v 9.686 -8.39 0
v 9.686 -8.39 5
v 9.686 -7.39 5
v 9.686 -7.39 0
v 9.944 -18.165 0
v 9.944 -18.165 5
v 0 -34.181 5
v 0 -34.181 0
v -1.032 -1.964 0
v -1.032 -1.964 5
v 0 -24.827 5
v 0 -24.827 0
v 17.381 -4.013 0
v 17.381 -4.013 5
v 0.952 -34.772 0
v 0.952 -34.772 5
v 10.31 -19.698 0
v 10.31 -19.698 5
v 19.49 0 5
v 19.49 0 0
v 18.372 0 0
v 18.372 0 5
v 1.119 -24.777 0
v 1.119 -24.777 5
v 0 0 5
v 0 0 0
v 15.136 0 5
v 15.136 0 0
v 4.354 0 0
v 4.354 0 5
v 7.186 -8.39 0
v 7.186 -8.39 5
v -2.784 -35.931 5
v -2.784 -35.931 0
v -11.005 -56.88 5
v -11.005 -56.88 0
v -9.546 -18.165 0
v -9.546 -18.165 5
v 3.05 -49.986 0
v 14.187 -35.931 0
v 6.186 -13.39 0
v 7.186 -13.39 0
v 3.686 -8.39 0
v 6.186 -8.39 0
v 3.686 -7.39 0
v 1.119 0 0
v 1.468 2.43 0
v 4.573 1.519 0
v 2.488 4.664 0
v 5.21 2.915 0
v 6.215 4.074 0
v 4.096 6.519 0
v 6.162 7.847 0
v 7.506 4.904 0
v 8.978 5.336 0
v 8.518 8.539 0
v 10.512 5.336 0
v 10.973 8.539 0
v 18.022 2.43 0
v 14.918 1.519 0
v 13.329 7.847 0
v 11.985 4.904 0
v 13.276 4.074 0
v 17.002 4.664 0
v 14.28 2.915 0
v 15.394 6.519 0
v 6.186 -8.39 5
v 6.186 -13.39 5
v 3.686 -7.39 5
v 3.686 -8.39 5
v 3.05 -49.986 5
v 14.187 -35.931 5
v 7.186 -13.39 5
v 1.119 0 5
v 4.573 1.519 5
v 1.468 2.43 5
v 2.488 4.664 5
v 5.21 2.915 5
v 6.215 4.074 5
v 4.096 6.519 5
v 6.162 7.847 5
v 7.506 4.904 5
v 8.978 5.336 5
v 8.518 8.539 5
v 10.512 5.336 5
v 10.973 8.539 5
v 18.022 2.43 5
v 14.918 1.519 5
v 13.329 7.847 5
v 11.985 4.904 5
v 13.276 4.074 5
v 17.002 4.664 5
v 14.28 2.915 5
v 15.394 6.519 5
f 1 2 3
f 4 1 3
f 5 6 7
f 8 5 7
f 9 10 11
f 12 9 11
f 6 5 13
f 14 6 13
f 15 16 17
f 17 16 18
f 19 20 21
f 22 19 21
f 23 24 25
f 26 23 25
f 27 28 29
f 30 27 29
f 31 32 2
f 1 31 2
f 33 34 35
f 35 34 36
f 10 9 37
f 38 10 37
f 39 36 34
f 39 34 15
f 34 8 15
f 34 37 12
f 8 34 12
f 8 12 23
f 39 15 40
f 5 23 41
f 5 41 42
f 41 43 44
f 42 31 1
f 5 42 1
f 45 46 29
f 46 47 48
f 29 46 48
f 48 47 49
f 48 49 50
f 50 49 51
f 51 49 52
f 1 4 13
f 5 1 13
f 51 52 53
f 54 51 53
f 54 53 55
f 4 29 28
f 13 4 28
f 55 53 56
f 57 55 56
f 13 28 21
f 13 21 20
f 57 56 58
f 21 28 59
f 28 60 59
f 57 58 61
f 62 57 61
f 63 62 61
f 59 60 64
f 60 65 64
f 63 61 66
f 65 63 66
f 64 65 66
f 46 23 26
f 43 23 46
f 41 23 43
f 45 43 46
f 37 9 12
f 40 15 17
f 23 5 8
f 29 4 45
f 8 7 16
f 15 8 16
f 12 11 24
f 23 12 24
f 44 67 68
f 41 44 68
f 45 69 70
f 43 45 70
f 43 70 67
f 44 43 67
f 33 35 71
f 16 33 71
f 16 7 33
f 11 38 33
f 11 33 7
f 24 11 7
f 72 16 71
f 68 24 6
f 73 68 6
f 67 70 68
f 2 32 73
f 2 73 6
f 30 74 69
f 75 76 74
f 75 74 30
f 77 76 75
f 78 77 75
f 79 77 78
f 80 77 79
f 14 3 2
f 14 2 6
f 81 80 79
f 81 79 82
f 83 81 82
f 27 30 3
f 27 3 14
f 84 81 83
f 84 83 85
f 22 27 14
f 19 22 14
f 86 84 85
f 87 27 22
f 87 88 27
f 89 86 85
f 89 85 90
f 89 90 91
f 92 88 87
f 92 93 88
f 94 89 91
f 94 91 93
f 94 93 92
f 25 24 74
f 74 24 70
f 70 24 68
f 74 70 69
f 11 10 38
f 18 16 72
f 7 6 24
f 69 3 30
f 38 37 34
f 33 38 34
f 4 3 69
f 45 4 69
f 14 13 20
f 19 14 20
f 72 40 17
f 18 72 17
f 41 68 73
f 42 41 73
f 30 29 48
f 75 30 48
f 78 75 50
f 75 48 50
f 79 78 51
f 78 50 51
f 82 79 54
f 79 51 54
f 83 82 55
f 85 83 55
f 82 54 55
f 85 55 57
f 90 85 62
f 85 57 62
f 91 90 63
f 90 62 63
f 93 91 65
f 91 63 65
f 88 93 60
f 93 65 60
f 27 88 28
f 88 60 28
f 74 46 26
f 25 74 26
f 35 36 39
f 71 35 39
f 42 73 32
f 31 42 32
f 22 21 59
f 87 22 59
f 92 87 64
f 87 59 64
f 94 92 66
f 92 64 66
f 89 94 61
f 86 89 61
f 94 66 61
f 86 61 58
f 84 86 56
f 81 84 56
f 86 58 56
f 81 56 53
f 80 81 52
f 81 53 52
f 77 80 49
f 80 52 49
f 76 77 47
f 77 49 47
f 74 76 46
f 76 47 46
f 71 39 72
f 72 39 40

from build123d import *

# Parameters (mm, degrees)
F1_DEPTH = 5
F3_DEPTH = 25
F5_DEPTH = 25


with BuildPart() as f1:
    # F0 (on Top) → F1 (new body)
    with BuildSketch(Plane.XY):
        with BuildLine():
            ThreePointArc((4.3541757575, 0), (9.7452402115, 5.391064454), (15.1363046655, 0))
            Line((15.1363046655, 0), (18.3717107881, 0))
            ThreePointArc((18.3717107881, 0), (9.7452402115, 8.6264705766), (1.1187696349, 0))
            Line((1.1187696349, 0), (4.3541757575, 0))
        make_face()
        with BuildLine():
            Line((18.3717107881, 0), (15.1363046655, 0))
            ThreePointArc((15.1363046655, 0), (9.7452402115, -5.391064454), (4.3541757575, 0))
            Line((4.3541757575, 0), (1.1187696349, 0))
            ThreePointArc((1.1187696349, 0), (7.678470178, -8.3752287275), (17.3813779901, -4.0131526802))
            ThreePointArc((17.3813779901, -4.0131526802), (18.1204689389, -2.0667700335), (18.3717107881, 0))
        make_face()
        with BuildLine():
            Line((19.490480423, 0), (18.3717107881, 0))
            ThreePointArc((18.3717107881, 0), (18.1204689389, -2.0667700335), (17.3813779901, -4.0131526802))
            Line((17.3813779901, -4.0131526802), (19.490480423, 0))
        make_face()
        with BuildLine():
            ThreePointArc((17.3813779901, -4.0131526802), (7.678470178, -8.3752287275), (1.1187696349, 0))
            Line((1.1187696349, 0), (0, 0))
            Line((0, 0), (-9.5463581383, -18.164595589))
            Line((-9.5463581383, -18.164595589), (-2.7843534481, -35.9314270318))
            Line((-2.7843534481, -35.9314270318), (-11.0048279166, -56.8803735077))
            Line((-11.0048279166, -56.8803735077), (3.0495305546, -49.9857850373))
            Line((3.0495305546, -49.9857850373), (14.1869476065, -35.9314270318))
            Line((14.1869476065, -35.9314270318), (9.9441222847, -18.164595589))
            Line((9.9441222847, -18.164595589), (17.3813779901, -4.0131526802))
        make_face()
        with BuildLine():
            ThreePointArc((4.3541757575, 0), (9.7452402115, -5.391064454), (15.1363046655, 0))
            Line((15.1363046655, 0), (4.3541757575, 0))
        make_face()
    extrude(amount=F1_DEPTH)

    # F2 (on face) → F3 (cut)
    with BuildSketch(Plane.XY.offset(5)):
        Polygon((1.1187696349, -24.7765574604), (0, 0), (-1.0323523379, -1.9643368131), (0, -24.8270747891), align=None)
        Polygon((10.3103312495, -19.6980956646), (9.9441222847, -18.164595589), (0, -34.1810695827), (0.9515207789, -34.7718387486), align=None)
    extrude(amount=-F3_DEPTH, mode=Mode.SUBTRACT)

    # F4 (on face) → F5 (cut)
    with BuildSketch(Plane.XY.offset(5)):
        Polygon((3.6861358676, -8.3900917694), (6.1861358676, -8.3900917694), (6.1861358676, -13.3900917694), (7.1861358676, -13.3900917694), (7.1861358676, -8.3900917694), (9.6861358676, -8.3900917694), (9.6861358676, -7.3900917694), (9.0056210756, -7.3900917694), (3.6861358676, -7.3900917694), align=None)
    extrude(amount=-F5_DEPTH, mode=Mode.SUBTRACT)


solid = f1.part
